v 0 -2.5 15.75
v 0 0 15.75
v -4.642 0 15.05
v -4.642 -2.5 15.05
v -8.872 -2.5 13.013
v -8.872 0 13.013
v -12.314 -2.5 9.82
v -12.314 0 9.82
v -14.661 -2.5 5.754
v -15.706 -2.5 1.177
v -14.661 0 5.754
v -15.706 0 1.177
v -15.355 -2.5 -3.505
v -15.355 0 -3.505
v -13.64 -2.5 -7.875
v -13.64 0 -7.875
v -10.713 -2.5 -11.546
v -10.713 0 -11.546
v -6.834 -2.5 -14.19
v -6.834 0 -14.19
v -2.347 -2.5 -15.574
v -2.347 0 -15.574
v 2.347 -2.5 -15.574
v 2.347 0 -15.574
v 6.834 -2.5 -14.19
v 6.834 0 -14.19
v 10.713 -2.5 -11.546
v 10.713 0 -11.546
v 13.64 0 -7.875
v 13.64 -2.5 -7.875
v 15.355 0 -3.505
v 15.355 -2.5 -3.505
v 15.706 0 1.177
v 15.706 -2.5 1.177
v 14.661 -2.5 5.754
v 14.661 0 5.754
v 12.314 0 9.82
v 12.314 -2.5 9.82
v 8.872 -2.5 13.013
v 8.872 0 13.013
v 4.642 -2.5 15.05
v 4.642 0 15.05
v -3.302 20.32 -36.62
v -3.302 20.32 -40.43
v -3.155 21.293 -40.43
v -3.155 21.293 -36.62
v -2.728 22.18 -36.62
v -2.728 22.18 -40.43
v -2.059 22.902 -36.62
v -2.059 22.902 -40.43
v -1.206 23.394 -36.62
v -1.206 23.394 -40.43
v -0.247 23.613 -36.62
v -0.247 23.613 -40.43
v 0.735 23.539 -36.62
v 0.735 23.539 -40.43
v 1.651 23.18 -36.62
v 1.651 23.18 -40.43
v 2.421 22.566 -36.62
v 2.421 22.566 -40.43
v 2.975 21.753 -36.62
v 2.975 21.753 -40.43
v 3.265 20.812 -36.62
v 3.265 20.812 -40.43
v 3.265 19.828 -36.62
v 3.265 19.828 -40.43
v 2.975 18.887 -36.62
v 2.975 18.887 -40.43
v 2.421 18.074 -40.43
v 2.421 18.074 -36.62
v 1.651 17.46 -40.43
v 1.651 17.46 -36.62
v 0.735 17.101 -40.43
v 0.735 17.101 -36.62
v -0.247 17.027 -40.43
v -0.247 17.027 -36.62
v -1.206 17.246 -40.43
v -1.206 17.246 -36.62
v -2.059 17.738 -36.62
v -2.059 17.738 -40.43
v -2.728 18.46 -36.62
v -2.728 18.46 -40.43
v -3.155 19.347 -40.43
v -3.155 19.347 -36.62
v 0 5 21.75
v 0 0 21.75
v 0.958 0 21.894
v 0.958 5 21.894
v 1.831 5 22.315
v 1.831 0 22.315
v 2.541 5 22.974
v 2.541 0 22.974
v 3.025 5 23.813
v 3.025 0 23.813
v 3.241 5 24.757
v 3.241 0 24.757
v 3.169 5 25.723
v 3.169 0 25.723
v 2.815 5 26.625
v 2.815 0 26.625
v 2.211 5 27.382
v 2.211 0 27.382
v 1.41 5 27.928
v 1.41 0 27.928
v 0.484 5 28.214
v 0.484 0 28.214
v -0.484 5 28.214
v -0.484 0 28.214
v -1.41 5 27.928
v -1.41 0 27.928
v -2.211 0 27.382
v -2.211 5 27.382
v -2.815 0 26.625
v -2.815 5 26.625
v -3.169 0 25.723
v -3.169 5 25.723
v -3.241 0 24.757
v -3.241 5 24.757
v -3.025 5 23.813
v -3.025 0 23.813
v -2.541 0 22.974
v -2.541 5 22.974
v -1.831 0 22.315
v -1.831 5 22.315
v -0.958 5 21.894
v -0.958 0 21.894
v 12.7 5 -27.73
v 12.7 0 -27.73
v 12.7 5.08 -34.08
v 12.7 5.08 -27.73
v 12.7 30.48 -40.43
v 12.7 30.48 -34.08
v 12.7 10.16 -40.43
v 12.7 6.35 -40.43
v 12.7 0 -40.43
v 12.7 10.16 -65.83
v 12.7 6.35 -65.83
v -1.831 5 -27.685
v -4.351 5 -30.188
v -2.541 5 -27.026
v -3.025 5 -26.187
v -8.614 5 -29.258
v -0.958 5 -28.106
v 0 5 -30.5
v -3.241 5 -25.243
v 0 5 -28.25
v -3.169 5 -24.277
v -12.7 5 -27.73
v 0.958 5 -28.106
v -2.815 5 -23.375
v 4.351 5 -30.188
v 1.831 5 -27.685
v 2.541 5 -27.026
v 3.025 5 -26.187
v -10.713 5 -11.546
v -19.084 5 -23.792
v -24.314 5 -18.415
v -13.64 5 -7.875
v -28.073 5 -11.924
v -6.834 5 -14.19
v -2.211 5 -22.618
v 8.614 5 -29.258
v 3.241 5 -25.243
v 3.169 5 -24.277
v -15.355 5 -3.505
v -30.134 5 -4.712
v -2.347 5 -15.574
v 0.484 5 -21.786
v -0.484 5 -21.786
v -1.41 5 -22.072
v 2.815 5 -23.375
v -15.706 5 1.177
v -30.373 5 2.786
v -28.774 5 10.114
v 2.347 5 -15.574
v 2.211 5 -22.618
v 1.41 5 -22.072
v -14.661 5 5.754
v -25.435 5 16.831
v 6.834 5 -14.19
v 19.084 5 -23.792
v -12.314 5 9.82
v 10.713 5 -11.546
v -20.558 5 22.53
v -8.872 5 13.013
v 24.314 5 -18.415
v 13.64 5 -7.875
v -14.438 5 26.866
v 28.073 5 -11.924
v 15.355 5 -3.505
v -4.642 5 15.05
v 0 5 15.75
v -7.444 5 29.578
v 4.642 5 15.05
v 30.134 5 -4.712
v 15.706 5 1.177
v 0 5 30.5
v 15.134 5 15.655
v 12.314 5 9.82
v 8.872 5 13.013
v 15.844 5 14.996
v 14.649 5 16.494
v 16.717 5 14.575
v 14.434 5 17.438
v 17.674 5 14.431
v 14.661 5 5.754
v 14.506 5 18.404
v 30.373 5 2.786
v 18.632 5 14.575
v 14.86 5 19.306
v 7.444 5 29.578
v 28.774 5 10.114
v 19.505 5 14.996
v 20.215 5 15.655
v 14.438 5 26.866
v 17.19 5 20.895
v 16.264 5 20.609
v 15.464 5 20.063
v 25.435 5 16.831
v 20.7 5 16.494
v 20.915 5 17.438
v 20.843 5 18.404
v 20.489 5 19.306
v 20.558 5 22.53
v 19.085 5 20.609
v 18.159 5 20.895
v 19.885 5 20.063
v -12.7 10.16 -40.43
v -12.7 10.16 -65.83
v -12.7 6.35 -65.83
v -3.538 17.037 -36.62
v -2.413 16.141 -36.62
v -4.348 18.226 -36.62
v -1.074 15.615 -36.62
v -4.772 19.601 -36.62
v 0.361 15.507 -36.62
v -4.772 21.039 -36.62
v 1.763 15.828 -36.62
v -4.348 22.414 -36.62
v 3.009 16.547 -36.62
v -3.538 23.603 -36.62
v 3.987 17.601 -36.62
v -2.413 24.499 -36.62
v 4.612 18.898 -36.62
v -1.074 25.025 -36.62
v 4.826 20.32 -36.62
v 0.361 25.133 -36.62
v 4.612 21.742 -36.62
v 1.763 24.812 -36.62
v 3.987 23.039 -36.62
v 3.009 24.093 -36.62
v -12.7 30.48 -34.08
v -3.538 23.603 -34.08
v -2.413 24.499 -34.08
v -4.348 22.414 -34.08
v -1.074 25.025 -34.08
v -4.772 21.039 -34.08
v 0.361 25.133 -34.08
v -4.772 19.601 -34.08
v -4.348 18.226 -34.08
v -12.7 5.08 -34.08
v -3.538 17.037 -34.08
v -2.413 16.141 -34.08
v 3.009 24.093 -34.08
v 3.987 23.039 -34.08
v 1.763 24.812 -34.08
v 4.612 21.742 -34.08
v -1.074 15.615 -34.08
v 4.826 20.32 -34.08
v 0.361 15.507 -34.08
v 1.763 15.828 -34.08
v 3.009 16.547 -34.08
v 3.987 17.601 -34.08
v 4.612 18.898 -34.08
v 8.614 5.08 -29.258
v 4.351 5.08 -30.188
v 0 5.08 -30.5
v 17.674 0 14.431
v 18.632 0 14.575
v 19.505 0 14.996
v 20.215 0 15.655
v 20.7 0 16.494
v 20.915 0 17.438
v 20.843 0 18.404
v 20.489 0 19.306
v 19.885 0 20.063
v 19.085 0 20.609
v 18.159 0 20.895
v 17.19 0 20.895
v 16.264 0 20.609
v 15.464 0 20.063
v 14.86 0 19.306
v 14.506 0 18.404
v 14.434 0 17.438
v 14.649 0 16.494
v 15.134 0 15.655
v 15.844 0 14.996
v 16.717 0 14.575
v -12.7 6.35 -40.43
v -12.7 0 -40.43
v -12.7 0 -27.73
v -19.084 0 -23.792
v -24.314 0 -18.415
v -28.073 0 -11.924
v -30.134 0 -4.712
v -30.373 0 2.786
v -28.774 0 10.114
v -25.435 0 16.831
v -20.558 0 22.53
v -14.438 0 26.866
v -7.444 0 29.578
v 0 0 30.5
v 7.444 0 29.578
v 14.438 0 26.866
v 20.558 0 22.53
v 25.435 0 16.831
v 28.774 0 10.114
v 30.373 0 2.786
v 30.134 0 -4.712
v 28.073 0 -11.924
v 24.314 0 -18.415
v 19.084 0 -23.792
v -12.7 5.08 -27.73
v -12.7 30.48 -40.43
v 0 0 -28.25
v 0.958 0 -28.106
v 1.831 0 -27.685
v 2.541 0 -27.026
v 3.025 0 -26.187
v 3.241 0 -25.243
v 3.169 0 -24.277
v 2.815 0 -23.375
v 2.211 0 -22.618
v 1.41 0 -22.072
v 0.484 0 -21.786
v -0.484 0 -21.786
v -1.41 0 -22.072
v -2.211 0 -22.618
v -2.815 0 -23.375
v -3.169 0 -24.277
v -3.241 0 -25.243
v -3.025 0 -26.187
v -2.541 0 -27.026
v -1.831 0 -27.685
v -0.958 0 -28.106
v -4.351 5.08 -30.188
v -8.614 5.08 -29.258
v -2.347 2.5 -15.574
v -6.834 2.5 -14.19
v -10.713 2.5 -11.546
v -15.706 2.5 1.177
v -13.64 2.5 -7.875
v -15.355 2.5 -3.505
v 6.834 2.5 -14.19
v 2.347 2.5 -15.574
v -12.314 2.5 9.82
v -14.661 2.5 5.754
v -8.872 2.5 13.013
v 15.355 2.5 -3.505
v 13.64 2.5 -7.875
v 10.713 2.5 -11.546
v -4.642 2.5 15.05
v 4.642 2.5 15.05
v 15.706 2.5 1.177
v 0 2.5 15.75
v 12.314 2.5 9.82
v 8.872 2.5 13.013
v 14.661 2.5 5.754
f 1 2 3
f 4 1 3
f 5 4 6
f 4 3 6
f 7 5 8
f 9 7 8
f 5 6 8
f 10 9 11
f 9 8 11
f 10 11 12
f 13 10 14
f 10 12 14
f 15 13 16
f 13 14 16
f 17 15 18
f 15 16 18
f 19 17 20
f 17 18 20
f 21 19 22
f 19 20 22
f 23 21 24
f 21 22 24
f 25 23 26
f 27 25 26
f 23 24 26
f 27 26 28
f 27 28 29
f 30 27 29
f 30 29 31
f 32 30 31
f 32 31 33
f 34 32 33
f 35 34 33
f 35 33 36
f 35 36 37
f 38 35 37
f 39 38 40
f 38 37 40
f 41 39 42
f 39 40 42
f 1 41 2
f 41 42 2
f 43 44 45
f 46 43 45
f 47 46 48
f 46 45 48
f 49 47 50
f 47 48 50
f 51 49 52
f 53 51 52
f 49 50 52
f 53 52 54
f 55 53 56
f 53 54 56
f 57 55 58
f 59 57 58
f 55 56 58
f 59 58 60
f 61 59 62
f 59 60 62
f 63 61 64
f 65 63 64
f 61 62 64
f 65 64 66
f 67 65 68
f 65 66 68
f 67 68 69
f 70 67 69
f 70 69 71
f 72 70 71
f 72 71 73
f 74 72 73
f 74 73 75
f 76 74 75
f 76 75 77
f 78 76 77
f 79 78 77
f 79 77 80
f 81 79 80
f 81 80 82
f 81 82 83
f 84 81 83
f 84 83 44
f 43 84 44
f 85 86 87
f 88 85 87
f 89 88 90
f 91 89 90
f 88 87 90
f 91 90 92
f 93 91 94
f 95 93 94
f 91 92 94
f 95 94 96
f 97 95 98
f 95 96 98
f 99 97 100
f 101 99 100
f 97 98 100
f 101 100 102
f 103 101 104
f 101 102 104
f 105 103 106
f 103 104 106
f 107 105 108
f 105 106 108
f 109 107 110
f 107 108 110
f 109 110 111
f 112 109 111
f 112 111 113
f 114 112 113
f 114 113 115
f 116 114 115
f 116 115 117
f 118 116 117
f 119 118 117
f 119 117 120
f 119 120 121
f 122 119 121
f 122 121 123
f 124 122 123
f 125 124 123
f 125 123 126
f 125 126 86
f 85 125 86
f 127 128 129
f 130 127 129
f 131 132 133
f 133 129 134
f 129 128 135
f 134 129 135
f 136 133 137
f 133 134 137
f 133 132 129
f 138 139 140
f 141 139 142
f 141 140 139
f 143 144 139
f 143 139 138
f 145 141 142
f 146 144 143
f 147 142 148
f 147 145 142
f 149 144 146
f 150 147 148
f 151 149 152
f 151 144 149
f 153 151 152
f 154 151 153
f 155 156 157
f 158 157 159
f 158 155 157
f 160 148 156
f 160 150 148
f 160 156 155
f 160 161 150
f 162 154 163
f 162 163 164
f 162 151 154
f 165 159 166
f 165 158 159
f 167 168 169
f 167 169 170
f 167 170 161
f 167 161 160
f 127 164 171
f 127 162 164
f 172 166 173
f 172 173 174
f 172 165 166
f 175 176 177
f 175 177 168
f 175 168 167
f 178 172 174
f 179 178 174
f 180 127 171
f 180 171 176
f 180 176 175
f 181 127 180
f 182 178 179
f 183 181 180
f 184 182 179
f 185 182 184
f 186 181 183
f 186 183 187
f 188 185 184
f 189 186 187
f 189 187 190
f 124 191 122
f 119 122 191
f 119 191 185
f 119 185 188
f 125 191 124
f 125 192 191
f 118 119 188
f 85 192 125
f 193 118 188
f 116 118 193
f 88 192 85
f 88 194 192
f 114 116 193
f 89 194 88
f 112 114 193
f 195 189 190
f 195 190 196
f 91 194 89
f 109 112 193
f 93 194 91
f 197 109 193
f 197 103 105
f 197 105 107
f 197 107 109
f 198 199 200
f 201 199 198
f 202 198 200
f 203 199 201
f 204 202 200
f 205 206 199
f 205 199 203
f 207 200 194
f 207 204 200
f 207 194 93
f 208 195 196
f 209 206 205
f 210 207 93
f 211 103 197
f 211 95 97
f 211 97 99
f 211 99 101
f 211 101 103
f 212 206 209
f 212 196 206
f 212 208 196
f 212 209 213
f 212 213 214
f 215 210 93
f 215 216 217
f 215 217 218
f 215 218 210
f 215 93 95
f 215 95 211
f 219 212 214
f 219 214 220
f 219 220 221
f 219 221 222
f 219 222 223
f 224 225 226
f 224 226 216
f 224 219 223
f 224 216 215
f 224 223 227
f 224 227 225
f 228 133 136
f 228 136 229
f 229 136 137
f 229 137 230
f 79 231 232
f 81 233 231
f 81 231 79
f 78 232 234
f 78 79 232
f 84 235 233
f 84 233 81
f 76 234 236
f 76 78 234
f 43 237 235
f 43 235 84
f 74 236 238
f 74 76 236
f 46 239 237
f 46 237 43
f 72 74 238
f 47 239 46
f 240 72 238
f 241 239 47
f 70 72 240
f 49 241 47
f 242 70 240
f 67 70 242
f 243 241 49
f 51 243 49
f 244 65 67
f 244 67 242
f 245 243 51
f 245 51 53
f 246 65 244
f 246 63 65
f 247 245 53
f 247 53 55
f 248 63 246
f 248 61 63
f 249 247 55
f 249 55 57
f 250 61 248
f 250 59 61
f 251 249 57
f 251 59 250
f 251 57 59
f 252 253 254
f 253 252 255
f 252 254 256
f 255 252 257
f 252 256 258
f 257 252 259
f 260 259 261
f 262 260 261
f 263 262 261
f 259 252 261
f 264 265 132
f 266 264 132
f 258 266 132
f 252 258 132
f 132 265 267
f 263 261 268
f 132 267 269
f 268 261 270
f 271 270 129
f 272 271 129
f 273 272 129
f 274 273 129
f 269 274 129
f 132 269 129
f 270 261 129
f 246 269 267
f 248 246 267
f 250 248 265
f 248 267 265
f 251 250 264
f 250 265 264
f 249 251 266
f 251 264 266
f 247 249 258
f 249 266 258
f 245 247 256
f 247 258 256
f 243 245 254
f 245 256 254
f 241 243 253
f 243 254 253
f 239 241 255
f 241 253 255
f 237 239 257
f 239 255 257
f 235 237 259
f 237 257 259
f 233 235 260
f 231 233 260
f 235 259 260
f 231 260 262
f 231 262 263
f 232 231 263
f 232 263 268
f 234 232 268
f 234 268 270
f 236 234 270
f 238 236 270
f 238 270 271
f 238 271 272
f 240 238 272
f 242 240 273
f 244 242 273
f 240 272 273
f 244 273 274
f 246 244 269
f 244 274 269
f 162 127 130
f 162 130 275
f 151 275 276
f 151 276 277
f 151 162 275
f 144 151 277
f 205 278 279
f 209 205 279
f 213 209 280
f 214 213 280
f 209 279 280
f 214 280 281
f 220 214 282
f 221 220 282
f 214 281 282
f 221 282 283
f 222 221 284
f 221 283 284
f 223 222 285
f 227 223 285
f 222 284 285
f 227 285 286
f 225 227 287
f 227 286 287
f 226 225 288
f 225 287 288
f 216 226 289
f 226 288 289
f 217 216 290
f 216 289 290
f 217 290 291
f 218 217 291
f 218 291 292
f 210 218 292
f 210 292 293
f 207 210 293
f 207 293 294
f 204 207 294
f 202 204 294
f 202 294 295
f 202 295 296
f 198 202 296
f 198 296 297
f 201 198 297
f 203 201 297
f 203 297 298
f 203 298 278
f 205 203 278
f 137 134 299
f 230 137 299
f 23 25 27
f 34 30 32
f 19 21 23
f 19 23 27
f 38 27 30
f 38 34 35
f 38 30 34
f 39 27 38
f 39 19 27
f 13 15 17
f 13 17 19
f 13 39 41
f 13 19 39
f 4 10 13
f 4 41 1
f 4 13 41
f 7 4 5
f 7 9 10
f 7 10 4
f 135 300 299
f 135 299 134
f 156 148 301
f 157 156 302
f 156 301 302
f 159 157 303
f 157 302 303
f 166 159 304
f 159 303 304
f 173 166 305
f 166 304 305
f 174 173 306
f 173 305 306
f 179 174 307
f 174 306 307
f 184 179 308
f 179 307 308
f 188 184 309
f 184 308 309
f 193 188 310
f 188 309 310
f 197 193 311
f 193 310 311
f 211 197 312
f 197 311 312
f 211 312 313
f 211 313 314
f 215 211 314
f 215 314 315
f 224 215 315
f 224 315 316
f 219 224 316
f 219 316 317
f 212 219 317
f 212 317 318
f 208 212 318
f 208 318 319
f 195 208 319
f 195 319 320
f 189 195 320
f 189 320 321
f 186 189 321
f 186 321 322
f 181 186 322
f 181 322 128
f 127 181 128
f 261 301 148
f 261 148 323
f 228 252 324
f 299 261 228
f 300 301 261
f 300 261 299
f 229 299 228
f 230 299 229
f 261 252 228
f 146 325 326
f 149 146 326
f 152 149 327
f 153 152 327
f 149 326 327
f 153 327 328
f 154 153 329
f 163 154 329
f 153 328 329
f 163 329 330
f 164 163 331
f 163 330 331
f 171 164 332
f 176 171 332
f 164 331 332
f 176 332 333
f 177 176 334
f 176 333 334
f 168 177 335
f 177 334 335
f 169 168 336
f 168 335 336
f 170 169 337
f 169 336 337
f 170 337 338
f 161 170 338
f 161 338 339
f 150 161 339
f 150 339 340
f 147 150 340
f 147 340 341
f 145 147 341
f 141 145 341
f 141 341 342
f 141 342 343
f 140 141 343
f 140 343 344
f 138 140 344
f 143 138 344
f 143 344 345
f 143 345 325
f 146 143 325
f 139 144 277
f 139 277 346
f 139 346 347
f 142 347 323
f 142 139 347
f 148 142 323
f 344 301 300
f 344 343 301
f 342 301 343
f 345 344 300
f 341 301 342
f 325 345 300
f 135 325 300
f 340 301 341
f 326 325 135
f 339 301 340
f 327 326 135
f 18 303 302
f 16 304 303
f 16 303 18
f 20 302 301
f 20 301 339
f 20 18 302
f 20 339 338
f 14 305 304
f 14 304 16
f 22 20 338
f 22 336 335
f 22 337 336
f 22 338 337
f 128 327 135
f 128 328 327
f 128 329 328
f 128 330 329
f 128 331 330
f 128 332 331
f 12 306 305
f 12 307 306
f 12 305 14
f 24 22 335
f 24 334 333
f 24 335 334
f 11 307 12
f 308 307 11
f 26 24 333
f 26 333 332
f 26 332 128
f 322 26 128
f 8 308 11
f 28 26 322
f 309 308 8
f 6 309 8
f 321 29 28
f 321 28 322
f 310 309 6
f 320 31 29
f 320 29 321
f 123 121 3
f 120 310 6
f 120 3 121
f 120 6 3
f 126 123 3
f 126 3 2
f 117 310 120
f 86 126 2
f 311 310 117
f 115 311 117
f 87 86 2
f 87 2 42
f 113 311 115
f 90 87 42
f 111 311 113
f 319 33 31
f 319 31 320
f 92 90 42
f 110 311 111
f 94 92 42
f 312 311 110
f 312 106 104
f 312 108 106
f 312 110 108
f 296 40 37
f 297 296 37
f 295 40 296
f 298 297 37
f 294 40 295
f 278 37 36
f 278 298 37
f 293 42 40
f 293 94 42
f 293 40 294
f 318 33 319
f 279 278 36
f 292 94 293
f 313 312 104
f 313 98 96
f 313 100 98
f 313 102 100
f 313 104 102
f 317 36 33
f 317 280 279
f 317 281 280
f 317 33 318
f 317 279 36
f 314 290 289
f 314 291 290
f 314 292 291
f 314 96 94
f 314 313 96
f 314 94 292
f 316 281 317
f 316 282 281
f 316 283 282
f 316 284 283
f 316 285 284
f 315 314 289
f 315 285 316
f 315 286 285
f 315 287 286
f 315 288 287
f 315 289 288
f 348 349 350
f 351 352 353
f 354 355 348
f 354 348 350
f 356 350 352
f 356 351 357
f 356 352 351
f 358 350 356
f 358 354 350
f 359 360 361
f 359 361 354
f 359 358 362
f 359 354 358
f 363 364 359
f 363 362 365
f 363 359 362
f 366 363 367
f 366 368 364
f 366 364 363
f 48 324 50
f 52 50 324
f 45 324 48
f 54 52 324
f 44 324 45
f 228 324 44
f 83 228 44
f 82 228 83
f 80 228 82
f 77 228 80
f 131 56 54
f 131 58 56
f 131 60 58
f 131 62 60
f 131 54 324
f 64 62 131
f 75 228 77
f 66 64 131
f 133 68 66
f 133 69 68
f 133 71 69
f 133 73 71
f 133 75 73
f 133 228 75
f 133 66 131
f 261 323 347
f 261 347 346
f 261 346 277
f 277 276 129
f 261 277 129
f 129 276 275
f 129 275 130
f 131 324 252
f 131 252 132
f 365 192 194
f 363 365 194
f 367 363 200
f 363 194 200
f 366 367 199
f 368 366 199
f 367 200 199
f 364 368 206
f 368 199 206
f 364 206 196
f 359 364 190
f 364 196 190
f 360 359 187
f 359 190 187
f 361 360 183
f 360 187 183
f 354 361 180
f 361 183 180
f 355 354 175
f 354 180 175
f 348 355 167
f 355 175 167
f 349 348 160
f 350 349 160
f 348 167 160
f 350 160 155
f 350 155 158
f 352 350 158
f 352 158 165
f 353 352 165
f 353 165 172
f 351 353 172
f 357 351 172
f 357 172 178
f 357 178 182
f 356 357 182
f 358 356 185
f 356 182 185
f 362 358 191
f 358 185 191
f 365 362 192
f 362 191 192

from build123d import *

# Parameters (mm, degrees)
SKETCH1_R           = 30.5
BOSS_EXTRUDE1_DEPTH = 5
SKETCH2_R           = 15.75
CUT_EXTRUDE1_DEPTH  = 2.5
SKETCH3_R           = 15.75
BOSS_EXTRUDE2_DEPTH = 2.5
SKETCH4_R           = 3.25
CUT_EXTRUDE2_DEPTH  = 5.08
SKETCH5_R           = 3.25
CUT_EXTRUDE3_DEPTH  = 5.08
SKETCH6_R           = 3.25
CUT_EXTRUDE4_DEPTH  = 5.08
BOSS_EXTRUDE3_DEPTH = 5.08
SKETCH8_W           = 25.4
SKETCH8_H           = 6.35
BOSS_EXTRUDE4_DEPTH = 25.4
SKETCH9_W           = 25.4
SKETCH9_H           = 3.81
BOSS_EXTRUDE5_DEPTH = 25.4
SKETCH10_R          = 3.302
CUT_EXTRUDE5_DEPTH  = 7.62
SKETCH12_R          = 4.826
CUT_EXTRUDE6_DEPTH  = 2.54


with BuildPart() as part:
    # Sketch1 → Boss-Extrude1 (new body)
    with BuildSketch(Plane(origin=(0, 0, 0), x_dir=(1, 0, 0), z_dir=(0, 1, 0))):
        with Locations(Location((0, 0, 0), (0, 0, 270))):
            Circle(SKETCH1_R)
    extrude(amount=BOSS_EXTRUDE1_DEPTH)

    # Sketch2 → Cut-Extrude1 (cut)
    with BuildSketch(Plane(origin=(0, 5, 0), x_dir=(1, 0, 0), z_dir=(0, 1, 0))):
        with Locations(Location((0, 0, 0), (0, 0, 270))):
            Circle(SKETCH2_R)
    extrude(amount=-CUT_EXTRUDE1_DEPTH, mode=Mode.SUBTRACT)

    # Sketch3 → Boss-Extrude2 (add)
    with BuildSketch(Plane.XZ):
        with Locations(Location((0, 0, 0), (0, 0, 90))):
            Circle(SKETCH3_R)
    extrude(amount=BOSS_EXTRUDE2_DEPTH)

    # Sketch4 → Cut-Extrude2 (cut)
    with BuildSketch(Plane(origin=(0, 0, 0), x_dir=(-1, 0, 0), z_dir=(0, -1, 0))):
        with Locations(Location((0, 25, 0), (0, 0, 90))):
            Circle(SKETCH4_R)
    extrude(amount=-CUT_EXTRUDE2_DEPTH, mode=Mode.SUBTRACT)

    # Sketch5 → Cut-Extrude3 (cut)
    with BuildSketch(Plane.XZ):
        with Locations(Location((0, 25, 0), (0, 0, 270))):
            Circle(SKETCH5_R)
    extrude(amount=-CUT_EXTRUDE3_DEPTH, mode=Mode.SUBTRACT)

    # Sketch6 → Cut-Extrude4 (cut)
    with BuildSketch(Plane.XZ):
        with Locations(Location((17.674476483, 17.680862, 0), (0, 0, 270))):
            Circle(SKETCH6_R)
    extrude(amount=-CUT_EXTRUDE4_DEPTH, mode=Mode.SUBTRACT)

    # Sketch7 → Boss-Extrude3 (add)
    with BuildSketch(Plane.XZ):
        with BuildLine():
            ThreePointArc((12.7, -27.73012802), (6.499272859, -29.79948745), (0, -30.5))
            ThreePointArc((0, -30.5), (-6.499272859, -29.79948745), (-12.7, -27.73012802))
            Line((-12.7, -27.73012802), (-12.7, -40.43012802))
            Line((-12.7, -40.43012802), (12.7, -40.43012802))
            Line((12.7, -40.43012802), (12.7, -27.73012802))
        make_face()
    extrude(amount=-BOSS_EXTRUDE3_DEPTH)

    # Sketch8 → Boss-Extrude4 (add)
    with BuildSketch(Plane(origin=(0, 5.08, 0), x_dir=(1, 0, 0), z_dir=(0, 1, 0))):
        with Locations((0, 37.25512802)):
            Rectangle(SKETCH8_W, SKETCH8_H)
    extrude(amount=BOSS_EXTRUDE4_DEPTH)

    # Sketch9 → Boss-Extrude5 (add)
    with BuildSketch(Plane(origin=(0, 0, -40.43012802), x_dir=(-1, 0, 0), z_dir=(0, 0, -1))):
        with Locations((0, 8.255)):
            Rectangle(SKETCH9_W, SKETCH9_H)
    extrude(amount=BOSS_EXTRUDE5_DEPTH)

    # Sketch10 → Cut-Extrude5 (cut)
    with BuildSketch(Plane(origin=(0, 0, -40.43012802), x_dir=(-1, 0, 0), z_dir=(0, 0, -1))):
        with Locations((0, 20.32)):
            Circle(SKETCH10_R)
    extrude(amount=-CUT_EXTRUDE5_DEPTH, mode=Mode.SUBTRACT)

    # Sketch12 → Cut-Extrude6 (cut)
    with BuildSketch(Plane.XY.offset(-34.08012802)):
        with Locations((0, 20.32)):
            Circle(SKETCH12_R)
    extrude(amount=-CUT_EXTRUDE6_DEPTH, mode=Mode.SUBTRACT)


solid = part.part
